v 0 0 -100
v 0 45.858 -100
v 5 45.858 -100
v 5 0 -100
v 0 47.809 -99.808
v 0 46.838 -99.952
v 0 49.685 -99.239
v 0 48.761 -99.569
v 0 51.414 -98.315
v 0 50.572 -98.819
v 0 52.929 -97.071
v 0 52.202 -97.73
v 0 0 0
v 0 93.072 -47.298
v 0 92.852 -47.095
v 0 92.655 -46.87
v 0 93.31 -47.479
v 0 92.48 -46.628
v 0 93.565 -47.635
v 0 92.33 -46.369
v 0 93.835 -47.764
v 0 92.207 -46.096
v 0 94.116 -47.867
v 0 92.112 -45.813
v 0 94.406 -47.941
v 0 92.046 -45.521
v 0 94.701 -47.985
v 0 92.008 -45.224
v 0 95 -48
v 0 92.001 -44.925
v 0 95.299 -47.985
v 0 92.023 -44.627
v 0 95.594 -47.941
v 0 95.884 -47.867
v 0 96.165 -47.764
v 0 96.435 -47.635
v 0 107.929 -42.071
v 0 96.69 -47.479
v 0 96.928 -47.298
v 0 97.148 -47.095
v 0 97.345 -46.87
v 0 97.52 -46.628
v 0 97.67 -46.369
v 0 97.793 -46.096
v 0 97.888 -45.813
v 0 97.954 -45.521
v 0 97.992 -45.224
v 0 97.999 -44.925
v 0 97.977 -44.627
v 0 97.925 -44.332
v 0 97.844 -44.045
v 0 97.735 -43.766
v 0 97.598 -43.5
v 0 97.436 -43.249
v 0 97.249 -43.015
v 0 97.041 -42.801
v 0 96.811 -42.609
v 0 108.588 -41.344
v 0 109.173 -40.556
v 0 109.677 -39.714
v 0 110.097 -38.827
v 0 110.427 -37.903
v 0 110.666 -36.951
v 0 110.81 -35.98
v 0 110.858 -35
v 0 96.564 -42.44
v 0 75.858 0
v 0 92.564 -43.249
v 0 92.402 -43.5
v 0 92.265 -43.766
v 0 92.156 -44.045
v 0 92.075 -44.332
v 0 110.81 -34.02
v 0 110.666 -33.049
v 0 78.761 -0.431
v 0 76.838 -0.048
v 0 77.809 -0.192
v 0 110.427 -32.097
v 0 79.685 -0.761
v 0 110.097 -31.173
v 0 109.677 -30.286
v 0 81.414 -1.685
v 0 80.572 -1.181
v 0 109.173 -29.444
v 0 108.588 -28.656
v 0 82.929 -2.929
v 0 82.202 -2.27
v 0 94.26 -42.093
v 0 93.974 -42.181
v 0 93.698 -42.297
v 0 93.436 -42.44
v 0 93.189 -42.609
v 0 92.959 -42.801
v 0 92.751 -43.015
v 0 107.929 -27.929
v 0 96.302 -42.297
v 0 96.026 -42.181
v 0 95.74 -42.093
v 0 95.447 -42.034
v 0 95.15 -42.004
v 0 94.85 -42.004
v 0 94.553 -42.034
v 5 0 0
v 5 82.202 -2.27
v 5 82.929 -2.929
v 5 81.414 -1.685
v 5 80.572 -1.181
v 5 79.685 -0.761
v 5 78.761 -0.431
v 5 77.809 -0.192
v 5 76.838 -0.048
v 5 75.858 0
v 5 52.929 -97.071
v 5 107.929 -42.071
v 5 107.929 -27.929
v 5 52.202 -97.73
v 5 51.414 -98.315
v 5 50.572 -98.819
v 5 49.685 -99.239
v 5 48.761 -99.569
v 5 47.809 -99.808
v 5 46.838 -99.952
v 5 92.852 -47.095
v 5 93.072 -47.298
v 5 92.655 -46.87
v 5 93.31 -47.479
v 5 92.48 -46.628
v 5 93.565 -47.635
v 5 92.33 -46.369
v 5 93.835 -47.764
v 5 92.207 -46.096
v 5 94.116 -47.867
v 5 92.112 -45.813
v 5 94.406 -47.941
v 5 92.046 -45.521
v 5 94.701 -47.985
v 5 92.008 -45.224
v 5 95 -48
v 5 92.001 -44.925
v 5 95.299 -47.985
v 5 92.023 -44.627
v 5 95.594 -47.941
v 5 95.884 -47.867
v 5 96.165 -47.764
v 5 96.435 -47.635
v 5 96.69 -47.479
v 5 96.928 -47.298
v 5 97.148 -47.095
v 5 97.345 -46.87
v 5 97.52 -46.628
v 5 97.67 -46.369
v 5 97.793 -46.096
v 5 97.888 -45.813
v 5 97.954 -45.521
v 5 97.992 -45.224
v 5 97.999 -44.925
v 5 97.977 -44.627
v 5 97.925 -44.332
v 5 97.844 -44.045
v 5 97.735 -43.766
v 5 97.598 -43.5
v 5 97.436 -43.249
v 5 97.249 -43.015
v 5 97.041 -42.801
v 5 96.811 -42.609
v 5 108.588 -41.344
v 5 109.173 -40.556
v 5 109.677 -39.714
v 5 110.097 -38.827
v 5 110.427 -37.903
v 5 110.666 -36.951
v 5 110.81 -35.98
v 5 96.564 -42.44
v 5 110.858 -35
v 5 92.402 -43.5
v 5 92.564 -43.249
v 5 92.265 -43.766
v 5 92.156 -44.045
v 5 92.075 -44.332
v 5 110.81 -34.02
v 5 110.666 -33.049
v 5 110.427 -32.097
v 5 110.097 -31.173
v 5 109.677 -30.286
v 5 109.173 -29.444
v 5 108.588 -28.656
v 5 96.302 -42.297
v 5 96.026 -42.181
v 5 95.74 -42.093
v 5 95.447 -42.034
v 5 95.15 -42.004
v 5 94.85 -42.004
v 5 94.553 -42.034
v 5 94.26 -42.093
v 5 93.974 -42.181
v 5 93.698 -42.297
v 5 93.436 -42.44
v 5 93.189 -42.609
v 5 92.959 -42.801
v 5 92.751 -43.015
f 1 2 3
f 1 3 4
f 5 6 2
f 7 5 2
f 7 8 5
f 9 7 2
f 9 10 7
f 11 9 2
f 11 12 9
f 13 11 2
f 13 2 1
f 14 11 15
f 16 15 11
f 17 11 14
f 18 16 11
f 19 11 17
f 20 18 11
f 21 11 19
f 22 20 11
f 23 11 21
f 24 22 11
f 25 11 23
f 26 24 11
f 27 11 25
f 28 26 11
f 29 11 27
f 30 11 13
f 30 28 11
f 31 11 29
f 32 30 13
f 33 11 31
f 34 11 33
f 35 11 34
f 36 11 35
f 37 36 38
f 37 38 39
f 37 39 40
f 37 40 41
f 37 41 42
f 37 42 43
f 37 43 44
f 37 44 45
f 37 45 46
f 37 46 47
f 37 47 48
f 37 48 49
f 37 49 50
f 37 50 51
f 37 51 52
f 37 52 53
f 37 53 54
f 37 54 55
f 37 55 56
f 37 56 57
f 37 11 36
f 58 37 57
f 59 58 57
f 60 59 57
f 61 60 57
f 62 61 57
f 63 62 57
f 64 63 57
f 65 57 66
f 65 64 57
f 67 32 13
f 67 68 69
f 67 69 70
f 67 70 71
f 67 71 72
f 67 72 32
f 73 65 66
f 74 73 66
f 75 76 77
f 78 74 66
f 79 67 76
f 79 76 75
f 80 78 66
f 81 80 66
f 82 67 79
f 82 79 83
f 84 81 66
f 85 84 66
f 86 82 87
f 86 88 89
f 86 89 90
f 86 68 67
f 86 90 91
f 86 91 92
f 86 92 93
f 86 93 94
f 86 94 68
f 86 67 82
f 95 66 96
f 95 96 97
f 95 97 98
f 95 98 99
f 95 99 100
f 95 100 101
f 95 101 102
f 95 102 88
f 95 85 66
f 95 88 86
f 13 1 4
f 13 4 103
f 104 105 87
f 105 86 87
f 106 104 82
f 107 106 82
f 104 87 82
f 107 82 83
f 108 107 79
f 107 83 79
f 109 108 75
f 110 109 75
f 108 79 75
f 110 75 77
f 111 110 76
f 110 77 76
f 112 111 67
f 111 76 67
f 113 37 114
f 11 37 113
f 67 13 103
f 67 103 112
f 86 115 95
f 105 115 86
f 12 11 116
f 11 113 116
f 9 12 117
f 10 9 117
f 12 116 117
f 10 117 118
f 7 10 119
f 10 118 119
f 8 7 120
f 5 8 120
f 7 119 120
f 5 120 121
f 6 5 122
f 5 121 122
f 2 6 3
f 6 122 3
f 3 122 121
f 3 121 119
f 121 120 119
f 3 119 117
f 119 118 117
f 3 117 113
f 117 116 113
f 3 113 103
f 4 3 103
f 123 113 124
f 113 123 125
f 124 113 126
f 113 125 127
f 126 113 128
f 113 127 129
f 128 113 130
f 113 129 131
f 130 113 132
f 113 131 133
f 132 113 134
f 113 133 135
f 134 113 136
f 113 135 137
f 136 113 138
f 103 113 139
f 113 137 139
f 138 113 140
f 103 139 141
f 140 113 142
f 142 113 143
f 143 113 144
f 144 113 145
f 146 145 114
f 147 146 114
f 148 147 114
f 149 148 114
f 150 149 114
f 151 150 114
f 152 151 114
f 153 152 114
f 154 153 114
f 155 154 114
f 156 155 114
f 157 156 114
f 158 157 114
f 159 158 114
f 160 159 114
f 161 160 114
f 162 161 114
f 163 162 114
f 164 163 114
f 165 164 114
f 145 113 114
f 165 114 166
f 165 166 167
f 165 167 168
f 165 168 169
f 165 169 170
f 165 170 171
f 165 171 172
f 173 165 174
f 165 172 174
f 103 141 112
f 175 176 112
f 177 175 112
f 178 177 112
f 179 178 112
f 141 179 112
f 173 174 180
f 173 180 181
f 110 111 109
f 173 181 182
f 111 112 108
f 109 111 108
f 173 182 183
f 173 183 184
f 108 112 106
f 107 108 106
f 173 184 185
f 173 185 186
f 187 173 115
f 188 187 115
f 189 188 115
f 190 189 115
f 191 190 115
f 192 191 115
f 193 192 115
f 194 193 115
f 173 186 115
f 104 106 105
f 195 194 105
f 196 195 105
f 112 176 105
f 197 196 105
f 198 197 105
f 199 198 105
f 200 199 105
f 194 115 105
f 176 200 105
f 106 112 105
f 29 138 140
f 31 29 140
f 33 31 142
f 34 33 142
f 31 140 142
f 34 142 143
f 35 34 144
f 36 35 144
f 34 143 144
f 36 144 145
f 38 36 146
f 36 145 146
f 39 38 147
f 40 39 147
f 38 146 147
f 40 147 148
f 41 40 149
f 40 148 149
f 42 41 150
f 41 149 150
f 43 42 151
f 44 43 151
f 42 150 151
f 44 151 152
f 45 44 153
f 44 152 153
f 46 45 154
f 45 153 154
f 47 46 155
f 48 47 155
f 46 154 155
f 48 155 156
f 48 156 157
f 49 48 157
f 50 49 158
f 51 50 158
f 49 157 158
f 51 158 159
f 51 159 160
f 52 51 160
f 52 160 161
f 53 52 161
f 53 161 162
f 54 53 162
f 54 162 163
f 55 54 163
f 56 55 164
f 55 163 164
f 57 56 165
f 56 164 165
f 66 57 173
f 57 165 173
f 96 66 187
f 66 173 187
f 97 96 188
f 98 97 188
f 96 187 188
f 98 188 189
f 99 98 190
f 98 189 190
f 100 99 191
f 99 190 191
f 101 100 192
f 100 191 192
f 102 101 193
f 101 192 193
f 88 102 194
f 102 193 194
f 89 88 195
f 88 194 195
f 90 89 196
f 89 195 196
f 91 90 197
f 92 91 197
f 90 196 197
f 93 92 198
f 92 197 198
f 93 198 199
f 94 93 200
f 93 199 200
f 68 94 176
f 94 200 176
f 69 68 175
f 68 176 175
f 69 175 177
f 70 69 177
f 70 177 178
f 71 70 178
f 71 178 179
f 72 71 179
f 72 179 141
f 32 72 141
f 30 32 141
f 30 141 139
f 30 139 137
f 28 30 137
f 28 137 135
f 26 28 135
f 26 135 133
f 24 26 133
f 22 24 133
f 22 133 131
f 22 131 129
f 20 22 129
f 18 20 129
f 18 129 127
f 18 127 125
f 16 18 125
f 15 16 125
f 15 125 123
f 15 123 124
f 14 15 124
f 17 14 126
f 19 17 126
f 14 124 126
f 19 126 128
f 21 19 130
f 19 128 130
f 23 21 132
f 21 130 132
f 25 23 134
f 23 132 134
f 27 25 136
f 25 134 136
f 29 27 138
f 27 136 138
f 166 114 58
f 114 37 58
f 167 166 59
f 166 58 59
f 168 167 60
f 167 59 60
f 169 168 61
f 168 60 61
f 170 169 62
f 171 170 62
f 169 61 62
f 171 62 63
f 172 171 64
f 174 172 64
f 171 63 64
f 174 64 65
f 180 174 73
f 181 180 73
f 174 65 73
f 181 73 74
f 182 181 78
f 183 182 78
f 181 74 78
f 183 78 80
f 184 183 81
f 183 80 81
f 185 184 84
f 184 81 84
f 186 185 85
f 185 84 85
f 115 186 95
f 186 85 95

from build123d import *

# Parameters (mm, degrees)
EXTRUDE_1_DEPTH     = 5
SKETCH_2_R          = 3
CUT_EXTRUDE_1_DEPTH = 5
CUT_EXTRUDE_2_DEPTH = 10
FILLET_2_R          = 10


with BuildPart() as part:
    # 스케치1 → 보스-돌출1 (new body)
    with BuildSketch(Plane(origin=(0, 0, 0), x_dir=(0, 0, -1), z_dir=(1, 0, 0))):
        Polygon((0, 150), (100, 50), (100, 0), (0, 0), align=None)
    extrude(amount=EXTRUDE_1_DEPTH)

    # 스케치2 → 컷-돌출1 (cut)
    with BuildSketch(Plane(origin=(5, 0, 0), x_dir=(0, 0, -1), z_dir=(1, 0, 0))):
        with Locations((45, 95)):
            Circle(SKETCH_2_R)
    extrude(amount=-CUT_EXTRUDE_1_DEPTH, mode=Mode.SUBTRACT)

    # 스케치3 → 컷-돌출2 (cut)
    with BuildSketch(Plane(origin=(5, 0, 0), x_dir=(0, 0, -1), z_dir=(1, 0, 0))):
        Polygon((35, 115), (0, 80), (0, 150), align=None)
    extrude(amount=-CUT_EXTRUDE_2_DEPTH, mode=Mode.SUBTRACT)

    # 필렛2
    fillet_2_edges = [part.edges().sort_by_distance(p)[0] for p in [
        (2.5, 115, -35),
        (2.5, 80, 0),
        (2.5, 50, -100),
    ]]
    fillet(fillet_2_edges, radius=FILLET_2_R)


solid = part.part
